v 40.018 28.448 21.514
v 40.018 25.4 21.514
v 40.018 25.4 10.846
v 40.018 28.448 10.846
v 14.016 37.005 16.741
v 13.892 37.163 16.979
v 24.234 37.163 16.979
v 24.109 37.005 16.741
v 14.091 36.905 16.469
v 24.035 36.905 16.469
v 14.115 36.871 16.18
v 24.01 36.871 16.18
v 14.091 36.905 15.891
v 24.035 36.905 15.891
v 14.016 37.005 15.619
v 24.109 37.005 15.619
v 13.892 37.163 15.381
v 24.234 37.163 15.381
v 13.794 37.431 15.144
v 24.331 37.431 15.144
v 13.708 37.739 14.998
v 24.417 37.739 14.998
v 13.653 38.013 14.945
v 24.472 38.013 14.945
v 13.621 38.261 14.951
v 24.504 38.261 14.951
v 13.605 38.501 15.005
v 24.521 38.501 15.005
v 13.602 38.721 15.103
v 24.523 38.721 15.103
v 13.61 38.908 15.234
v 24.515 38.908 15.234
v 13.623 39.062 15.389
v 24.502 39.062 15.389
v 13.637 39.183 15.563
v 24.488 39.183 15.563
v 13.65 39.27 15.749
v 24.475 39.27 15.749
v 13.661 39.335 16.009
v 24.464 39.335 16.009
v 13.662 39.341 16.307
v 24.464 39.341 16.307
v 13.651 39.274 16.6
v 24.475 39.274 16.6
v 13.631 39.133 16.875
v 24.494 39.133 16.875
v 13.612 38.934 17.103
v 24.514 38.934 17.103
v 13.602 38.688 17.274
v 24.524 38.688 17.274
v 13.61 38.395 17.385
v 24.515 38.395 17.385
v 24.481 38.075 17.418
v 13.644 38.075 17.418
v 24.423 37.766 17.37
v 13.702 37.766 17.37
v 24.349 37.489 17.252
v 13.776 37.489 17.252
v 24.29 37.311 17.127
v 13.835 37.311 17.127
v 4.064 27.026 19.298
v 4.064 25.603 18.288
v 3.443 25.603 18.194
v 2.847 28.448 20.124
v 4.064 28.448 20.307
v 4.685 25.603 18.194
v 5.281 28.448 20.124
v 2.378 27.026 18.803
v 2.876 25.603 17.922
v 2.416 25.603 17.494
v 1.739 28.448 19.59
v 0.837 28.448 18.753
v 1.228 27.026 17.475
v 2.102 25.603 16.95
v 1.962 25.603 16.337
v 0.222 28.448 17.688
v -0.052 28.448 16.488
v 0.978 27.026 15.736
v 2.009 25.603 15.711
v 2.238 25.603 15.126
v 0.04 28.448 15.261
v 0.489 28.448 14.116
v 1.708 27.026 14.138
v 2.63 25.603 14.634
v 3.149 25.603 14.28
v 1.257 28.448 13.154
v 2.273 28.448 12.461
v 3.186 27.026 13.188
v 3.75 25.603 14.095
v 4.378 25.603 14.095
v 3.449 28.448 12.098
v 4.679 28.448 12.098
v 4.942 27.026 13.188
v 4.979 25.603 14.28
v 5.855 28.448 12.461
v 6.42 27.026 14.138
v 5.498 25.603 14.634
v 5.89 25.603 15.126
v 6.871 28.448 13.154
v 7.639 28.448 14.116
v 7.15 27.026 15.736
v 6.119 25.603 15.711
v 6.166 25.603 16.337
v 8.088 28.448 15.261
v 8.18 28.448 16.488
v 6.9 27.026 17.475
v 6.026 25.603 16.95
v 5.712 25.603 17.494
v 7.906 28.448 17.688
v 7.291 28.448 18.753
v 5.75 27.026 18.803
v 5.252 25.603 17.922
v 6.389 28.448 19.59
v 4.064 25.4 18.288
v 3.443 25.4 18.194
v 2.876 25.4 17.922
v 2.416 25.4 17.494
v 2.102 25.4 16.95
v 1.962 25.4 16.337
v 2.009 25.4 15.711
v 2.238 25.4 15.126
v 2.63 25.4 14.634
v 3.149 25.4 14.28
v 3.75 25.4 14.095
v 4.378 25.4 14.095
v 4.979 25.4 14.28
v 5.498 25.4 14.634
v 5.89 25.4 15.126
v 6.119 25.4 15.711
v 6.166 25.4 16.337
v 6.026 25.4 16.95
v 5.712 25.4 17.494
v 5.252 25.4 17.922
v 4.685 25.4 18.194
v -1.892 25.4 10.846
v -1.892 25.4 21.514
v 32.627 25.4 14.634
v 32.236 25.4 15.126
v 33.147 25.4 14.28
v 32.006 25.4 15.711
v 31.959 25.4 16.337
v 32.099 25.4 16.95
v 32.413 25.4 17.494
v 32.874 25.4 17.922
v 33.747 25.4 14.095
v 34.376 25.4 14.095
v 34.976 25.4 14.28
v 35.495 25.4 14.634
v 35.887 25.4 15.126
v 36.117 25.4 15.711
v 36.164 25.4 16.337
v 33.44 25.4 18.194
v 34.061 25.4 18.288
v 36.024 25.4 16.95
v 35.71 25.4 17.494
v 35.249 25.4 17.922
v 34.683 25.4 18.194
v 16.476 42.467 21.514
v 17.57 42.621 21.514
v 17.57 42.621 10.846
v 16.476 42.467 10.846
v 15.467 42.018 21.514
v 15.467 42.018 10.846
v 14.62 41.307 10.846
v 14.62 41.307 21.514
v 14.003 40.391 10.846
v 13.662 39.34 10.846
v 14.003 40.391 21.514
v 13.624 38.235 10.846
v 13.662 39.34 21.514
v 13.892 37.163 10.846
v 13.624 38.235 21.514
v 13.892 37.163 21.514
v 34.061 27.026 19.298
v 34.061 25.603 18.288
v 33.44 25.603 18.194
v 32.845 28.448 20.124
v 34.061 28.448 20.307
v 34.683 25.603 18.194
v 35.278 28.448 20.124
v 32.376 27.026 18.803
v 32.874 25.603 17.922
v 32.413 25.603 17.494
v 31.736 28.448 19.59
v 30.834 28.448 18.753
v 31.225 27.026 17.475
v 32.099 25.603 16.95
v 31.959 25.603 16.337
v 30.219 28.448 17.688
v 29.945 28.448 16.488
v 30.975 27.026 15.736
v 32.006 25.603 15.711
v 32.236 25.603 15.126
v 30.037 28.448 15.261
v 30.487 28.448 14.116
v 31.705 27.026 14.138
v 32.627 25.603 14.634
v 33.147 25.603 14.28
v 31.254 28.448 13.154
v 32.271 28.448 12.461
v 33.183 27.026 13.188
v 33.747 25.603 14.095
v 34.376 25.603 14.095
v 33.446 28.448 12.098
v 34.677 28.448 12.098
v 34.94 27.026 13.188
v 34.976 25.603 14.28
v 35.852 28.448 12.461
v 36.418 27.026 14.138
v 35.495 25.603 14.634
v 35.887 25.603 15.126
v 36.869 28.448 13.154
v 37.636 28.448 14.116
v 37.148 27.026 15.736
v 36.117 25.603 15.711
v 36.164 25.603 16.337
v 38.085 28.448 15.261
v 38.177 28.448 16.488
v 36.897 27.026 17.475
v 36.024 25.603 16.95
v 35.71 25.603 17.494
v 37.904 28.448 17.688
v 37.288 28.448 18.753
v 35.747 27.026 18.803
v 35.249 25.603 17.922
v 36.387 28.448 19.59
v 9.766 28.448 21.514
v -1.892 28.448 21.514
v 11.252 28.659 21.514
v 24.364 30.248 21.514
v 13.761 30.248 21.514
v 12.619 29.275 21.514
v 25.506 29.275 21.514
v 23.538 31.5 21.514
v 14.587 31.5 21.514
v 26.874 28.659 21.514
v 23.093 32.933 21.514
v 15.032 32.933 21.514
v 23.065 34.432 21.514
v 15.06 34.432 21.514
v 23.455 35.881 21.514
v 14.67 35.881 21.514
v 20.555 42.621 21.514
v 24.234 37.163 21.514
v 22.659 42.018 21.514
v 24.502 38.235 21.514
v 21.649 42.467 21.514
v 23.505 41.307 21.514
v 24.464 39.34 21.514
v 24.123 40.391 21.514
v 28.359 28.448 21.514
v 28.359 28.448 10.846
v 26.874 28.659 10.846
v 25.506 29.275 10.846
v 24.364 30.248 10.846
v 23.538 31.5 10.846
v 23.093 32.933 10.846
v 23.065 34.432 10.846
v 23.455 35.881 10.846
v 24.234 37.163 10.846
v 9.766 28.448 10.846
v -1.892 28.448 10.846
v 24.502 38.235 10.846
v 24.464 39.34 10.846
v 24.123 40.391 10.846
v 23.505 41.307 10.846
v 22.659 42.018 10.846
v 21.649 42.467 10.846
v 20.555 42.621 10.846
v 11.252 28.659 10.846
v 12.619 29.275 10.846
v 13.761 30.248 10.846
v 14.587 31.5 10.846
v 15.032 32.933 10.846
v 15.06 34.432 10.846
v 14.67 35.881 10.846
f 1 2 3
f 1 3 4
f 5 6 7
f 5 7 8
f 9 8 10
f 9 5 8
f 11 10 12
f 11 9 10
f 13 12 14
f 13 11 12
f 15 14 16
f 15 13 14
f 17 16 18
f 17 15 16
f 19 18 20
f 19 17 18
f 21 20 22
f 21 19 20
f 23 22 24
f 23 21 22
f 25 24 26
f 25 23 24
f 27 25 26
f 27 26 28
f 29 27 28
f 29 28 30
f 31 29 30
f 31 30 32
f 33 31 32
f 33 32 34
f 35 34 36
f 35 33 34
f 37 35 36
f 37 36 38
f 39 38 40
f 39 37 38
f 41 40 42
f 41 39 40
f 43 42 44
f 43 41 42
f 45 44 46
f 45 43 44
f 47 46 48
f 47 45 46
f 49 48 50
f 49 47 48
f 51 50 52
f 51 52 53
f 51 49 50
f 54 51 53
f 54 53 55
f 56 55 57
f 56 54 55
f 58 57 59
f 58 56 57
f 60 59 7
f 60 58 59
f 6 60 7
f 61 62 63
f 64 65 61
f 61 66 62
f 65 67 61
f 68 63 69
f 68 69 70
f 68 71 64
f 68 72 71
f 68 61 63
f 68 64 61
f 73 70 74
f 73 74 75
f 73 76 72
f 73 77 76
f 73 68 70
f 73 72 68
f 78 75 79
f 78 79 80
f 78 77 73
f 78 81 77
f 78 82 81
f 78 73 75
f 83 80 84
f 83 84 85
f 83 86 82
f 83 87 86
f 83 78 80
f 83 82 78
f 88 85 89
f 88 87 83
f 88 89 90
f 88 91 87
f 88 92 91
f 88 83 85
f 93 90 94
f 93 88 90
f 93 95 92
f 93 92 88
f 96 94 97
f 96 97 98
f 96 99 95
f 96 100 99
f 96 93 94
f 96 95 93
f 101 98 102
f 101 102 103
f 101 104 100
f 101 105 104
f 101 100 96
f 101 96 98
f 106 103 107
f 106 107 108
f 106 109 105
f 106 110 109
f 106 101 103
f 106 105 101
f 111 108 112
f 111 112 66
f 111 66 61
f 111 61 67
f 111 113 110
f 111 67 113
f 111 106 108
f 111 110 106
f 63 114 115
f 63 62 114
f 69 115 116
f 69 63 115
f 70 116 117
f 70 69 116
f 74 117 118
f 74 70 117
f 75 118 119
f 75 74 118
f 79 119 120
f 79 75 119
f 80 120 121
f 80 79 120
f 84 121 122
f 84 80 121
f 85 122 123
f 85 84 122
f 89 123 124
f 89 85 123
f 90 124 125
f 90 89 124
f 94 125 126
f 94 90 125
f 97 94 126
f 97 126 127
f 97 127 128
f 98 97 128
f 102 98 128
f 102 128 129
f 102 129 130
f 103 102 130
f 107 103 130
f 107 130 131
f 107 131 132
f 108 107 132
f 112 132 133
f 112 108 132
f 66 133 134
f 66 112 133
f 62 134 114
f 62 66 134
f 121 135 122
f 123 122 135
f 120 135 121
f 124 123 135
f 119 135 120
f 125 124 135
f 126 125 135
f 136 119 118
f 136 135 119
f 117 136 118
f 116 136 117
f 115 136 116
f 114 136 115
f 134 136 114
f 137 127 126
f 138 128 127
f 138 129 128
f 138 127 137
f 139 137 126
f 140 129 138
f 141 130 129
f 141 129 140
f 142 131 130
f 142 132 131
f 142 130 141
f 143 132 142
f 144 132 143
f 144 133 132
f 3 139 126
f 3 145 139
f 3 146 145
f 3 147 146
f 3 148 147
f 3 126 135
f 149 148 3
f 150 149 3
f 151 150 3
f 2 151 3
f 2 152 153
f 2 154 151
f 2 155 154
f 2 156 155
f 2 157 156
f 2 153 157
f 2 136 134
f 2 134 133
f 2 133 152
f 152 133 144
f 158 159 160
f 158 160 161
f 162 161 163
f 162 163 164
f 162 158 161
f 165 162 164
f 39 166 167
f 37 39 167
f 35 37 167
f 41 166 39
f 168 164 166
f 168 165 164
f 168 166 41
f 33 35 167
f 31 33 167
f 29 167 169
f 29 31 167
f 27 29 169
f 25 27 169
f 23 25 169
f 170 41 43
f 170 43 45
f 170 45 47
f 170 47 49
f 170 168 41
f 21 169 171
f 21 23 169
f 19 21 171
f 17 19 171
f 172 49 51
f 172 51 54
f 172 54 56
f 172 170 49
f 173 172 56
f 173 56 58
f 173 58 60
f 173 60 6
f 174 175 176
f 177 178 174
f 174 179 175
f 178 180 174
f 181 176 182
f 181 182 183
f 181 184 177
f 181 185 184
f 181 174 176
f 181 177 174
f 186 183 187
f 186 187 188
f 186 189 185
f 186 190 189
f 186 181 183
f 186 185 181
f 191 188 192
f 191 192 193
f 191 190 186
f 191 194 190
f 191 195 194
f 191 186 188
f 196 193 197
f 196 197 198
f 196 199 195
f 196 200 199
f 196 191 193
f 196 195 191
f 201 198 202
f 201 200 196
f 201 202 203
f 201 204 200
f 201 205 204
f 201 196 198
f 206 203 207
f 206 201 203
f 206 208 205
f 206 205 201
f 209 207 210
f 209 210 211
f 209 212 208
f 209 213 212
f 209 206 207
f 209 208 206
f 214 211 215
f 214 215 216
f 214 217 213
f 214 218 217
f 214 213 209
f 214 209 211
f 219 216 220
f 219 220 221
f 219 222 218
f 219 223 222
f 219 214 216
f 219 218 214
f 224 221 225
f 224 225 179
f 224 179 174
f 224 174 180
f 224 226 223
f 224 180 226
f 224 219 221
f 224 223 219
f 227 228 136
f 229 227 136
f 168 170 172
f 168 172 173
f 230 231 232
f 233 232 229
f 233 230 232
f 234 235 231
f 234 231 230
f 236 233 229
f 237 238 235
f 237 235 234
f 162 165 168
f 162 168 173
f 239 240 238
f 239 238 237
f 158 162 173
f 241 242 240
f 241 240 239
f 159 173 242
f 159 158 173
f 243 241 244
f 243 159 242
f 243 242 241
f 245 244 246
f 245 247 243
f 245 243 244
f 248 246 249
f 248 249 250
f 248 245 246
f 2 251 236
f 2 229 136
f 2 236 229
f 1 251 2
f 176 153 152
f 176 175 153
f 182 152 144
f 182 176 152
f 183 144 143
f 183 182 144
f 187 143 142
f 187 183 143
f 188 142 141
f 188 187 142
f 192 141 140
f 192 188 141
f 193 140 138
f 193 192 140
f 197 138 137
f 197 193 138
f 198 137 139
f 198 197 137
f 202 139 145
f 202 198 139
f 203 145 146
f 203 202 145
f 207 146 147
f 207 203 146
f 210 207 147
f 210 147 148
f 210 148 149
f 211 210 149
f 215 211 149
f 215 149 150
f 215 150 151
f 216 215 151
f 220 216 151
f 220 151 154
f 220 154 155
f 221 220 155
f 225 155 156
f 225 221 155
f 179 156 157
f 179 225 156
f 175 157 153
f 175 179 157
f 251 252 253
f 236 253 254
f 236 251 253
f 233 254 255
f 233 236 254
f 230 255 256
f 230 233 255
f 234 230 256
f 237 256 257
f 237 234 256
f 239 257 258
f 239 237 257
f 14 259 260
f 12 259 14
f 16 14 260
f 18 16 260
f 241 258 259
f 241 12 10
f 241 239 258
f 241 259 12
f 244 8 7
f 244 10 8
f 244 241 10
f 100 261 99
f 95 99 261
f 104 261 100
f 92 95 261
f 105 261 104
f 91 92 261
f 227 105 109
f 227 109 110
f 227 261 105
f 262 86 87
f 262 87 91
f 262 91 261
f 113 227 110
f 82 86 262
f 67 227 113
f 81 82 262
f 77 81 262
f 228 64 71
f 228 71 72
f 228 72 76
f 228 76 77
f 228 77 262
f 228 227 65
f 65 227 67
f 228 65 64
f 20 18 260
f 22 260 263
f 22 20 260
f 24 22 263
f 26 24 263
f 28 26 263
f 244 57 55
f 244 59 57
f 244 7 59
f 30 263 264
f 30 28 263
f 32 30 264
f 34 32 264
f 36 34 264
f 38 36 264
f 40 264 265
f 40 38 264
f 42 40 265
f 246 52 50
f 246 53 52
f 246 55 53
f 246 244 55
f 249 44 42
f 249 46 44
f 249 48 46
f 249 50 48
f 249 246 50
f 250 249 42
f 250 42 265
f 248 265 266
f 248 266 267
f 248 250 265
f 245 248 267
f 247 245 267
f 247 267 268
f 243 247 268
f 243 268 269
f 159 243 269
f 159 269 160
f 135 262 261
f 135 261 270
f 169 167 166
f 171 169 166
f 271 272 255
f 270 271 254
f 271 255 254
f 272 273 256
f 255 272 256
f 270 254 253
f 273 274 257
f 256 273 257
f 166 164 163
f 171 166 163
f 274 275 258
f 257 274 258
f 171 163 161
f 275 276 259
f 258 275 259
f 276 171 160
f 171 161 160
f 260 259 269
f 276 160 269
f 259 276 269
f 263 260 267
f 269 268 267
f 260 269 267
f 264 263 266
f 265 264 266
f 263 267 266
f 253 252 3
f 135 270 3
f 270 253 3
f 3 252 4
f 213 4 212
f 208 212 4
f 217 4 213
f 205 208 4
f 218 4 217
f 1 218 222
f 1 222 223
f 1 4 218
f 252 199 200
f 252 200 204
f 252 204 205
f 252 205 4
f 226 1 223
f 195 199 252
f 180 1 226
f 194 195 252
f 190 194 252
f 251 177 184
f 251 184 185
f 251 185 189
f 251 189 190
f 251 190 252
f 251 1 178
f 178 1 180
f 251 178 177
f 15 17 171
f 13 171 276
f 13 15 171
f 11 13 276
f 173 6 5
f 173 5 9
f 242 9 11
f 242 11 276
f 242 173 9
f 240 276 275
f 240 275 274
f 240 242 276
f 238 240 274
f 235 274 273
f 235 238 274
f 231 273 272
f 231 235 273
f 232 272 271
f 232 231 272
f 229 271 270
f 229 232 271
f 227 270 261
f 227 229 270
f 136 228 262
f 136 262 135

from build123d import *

# Parameters (mm, degrees)
BOSS_EXTRUDE1_DEPTH                       = 10.668
CSK_FOR_6_FLAT_HEAD_MACHINE_SCREW_2_COUNT = 2
CSK_FOR_6_FLAT_HEAD_MACHINE_SCREW_2_PITCH = 29.9974
SKETCH4_R                                 = 1.238307914
CUT_EXTRUDE1_DEPTH                        = 2540


with BuildPart() as part:
    # Sketch1 → Boss-Extrude1 (new body)
    with BuildSketch(Plane.XY.offset(21.5138)):
        with BuildLine():
            Line((9.7663, 28.448), (-1.8923, 28.448))
            Line((-1.8923, 28.448), (-1.8923, 25.4))
            Line((-1.8923, 25.4), (40.0177, 25.4))
            Line((40.0177, 25.4), (40.0177, 28.448))
            Line((40.0177, 28.448), (28.3591, 28.448))
            ThreePointArc((28.3591, 28.448), (23.537953793, 31.499872647), (24.233689565, 37.163204629))
            ThreePointArc((24.233689565, 37.163204629), (23.84595434, 40.870617487), (20.55495, 42.6212))
            Line((20.55495, 42.6212), (17.57045, 42.6212))
            ThreePointArc((17.57045, 42.6212), (14.27944566, 40.870617487), (13.891710435, 37.163204629))
            ThreePointArc((13.891710435, 37.163204629), (14.587446207, 31.499872647), (9.7663, 28.448))
        make_face()
    extrude(amount=-BOSS_EXTRUDE1_DEPTH)

    # Sketch2 → CSK for #6 Flat Head Machine Screw (100)1 (revolve, cut)
    with BuildSketch(Plane(origin=(34.0614, 28.448, 16.1798), x_dir=(0, 0, 1), z_dir=(1, 0, 0))):
        Polygon((0, 0), (0, 3.048), (2.1082, 3.048), (2.1082, 2.844805148), (4.1275, 0), align=None)
    csk_for_6_flat_head_machine_screw_100 = revolve(axis=Axis((34.0614, 34.798, 16.1798), (0, -1, 0)), mode=Mode.SUBTRACT)

    # CSK for _6 Flat Head Machine Screw _ 2: CSK for #6 Flat Head Machine Screw (100)1 ×2
    with Locations(*[(-i * CSK_FOR_6_FLAT_HEAD_MACHINE_SCREW_2_PITCH, 0, 0) for i in range(1, CSK_FOR_6_FLAT_HEAD_MACHINE_SCREW_2_COUNT)]):
        add(csk_for_6_flat_head_machine_screw_100, mode=Mode.SUBTRACT)

    # Sketch4 → Cut-Extrude1 (cut)
    with BuildSketch(Plane(origin=(0, 0, 0), x_dir=(0, 0, -1), z_dir=(1, 0, 0))):
        with Locations(Location((-16.1798, 38.109028288, 0), (0, 0, 229.800644601))):
            Circle(SKETCH4_R)
    extrude(amount=CUT_EXTRUDE1_DEPTH, mode=Mode.SUBTRACT)


solid = part.part
